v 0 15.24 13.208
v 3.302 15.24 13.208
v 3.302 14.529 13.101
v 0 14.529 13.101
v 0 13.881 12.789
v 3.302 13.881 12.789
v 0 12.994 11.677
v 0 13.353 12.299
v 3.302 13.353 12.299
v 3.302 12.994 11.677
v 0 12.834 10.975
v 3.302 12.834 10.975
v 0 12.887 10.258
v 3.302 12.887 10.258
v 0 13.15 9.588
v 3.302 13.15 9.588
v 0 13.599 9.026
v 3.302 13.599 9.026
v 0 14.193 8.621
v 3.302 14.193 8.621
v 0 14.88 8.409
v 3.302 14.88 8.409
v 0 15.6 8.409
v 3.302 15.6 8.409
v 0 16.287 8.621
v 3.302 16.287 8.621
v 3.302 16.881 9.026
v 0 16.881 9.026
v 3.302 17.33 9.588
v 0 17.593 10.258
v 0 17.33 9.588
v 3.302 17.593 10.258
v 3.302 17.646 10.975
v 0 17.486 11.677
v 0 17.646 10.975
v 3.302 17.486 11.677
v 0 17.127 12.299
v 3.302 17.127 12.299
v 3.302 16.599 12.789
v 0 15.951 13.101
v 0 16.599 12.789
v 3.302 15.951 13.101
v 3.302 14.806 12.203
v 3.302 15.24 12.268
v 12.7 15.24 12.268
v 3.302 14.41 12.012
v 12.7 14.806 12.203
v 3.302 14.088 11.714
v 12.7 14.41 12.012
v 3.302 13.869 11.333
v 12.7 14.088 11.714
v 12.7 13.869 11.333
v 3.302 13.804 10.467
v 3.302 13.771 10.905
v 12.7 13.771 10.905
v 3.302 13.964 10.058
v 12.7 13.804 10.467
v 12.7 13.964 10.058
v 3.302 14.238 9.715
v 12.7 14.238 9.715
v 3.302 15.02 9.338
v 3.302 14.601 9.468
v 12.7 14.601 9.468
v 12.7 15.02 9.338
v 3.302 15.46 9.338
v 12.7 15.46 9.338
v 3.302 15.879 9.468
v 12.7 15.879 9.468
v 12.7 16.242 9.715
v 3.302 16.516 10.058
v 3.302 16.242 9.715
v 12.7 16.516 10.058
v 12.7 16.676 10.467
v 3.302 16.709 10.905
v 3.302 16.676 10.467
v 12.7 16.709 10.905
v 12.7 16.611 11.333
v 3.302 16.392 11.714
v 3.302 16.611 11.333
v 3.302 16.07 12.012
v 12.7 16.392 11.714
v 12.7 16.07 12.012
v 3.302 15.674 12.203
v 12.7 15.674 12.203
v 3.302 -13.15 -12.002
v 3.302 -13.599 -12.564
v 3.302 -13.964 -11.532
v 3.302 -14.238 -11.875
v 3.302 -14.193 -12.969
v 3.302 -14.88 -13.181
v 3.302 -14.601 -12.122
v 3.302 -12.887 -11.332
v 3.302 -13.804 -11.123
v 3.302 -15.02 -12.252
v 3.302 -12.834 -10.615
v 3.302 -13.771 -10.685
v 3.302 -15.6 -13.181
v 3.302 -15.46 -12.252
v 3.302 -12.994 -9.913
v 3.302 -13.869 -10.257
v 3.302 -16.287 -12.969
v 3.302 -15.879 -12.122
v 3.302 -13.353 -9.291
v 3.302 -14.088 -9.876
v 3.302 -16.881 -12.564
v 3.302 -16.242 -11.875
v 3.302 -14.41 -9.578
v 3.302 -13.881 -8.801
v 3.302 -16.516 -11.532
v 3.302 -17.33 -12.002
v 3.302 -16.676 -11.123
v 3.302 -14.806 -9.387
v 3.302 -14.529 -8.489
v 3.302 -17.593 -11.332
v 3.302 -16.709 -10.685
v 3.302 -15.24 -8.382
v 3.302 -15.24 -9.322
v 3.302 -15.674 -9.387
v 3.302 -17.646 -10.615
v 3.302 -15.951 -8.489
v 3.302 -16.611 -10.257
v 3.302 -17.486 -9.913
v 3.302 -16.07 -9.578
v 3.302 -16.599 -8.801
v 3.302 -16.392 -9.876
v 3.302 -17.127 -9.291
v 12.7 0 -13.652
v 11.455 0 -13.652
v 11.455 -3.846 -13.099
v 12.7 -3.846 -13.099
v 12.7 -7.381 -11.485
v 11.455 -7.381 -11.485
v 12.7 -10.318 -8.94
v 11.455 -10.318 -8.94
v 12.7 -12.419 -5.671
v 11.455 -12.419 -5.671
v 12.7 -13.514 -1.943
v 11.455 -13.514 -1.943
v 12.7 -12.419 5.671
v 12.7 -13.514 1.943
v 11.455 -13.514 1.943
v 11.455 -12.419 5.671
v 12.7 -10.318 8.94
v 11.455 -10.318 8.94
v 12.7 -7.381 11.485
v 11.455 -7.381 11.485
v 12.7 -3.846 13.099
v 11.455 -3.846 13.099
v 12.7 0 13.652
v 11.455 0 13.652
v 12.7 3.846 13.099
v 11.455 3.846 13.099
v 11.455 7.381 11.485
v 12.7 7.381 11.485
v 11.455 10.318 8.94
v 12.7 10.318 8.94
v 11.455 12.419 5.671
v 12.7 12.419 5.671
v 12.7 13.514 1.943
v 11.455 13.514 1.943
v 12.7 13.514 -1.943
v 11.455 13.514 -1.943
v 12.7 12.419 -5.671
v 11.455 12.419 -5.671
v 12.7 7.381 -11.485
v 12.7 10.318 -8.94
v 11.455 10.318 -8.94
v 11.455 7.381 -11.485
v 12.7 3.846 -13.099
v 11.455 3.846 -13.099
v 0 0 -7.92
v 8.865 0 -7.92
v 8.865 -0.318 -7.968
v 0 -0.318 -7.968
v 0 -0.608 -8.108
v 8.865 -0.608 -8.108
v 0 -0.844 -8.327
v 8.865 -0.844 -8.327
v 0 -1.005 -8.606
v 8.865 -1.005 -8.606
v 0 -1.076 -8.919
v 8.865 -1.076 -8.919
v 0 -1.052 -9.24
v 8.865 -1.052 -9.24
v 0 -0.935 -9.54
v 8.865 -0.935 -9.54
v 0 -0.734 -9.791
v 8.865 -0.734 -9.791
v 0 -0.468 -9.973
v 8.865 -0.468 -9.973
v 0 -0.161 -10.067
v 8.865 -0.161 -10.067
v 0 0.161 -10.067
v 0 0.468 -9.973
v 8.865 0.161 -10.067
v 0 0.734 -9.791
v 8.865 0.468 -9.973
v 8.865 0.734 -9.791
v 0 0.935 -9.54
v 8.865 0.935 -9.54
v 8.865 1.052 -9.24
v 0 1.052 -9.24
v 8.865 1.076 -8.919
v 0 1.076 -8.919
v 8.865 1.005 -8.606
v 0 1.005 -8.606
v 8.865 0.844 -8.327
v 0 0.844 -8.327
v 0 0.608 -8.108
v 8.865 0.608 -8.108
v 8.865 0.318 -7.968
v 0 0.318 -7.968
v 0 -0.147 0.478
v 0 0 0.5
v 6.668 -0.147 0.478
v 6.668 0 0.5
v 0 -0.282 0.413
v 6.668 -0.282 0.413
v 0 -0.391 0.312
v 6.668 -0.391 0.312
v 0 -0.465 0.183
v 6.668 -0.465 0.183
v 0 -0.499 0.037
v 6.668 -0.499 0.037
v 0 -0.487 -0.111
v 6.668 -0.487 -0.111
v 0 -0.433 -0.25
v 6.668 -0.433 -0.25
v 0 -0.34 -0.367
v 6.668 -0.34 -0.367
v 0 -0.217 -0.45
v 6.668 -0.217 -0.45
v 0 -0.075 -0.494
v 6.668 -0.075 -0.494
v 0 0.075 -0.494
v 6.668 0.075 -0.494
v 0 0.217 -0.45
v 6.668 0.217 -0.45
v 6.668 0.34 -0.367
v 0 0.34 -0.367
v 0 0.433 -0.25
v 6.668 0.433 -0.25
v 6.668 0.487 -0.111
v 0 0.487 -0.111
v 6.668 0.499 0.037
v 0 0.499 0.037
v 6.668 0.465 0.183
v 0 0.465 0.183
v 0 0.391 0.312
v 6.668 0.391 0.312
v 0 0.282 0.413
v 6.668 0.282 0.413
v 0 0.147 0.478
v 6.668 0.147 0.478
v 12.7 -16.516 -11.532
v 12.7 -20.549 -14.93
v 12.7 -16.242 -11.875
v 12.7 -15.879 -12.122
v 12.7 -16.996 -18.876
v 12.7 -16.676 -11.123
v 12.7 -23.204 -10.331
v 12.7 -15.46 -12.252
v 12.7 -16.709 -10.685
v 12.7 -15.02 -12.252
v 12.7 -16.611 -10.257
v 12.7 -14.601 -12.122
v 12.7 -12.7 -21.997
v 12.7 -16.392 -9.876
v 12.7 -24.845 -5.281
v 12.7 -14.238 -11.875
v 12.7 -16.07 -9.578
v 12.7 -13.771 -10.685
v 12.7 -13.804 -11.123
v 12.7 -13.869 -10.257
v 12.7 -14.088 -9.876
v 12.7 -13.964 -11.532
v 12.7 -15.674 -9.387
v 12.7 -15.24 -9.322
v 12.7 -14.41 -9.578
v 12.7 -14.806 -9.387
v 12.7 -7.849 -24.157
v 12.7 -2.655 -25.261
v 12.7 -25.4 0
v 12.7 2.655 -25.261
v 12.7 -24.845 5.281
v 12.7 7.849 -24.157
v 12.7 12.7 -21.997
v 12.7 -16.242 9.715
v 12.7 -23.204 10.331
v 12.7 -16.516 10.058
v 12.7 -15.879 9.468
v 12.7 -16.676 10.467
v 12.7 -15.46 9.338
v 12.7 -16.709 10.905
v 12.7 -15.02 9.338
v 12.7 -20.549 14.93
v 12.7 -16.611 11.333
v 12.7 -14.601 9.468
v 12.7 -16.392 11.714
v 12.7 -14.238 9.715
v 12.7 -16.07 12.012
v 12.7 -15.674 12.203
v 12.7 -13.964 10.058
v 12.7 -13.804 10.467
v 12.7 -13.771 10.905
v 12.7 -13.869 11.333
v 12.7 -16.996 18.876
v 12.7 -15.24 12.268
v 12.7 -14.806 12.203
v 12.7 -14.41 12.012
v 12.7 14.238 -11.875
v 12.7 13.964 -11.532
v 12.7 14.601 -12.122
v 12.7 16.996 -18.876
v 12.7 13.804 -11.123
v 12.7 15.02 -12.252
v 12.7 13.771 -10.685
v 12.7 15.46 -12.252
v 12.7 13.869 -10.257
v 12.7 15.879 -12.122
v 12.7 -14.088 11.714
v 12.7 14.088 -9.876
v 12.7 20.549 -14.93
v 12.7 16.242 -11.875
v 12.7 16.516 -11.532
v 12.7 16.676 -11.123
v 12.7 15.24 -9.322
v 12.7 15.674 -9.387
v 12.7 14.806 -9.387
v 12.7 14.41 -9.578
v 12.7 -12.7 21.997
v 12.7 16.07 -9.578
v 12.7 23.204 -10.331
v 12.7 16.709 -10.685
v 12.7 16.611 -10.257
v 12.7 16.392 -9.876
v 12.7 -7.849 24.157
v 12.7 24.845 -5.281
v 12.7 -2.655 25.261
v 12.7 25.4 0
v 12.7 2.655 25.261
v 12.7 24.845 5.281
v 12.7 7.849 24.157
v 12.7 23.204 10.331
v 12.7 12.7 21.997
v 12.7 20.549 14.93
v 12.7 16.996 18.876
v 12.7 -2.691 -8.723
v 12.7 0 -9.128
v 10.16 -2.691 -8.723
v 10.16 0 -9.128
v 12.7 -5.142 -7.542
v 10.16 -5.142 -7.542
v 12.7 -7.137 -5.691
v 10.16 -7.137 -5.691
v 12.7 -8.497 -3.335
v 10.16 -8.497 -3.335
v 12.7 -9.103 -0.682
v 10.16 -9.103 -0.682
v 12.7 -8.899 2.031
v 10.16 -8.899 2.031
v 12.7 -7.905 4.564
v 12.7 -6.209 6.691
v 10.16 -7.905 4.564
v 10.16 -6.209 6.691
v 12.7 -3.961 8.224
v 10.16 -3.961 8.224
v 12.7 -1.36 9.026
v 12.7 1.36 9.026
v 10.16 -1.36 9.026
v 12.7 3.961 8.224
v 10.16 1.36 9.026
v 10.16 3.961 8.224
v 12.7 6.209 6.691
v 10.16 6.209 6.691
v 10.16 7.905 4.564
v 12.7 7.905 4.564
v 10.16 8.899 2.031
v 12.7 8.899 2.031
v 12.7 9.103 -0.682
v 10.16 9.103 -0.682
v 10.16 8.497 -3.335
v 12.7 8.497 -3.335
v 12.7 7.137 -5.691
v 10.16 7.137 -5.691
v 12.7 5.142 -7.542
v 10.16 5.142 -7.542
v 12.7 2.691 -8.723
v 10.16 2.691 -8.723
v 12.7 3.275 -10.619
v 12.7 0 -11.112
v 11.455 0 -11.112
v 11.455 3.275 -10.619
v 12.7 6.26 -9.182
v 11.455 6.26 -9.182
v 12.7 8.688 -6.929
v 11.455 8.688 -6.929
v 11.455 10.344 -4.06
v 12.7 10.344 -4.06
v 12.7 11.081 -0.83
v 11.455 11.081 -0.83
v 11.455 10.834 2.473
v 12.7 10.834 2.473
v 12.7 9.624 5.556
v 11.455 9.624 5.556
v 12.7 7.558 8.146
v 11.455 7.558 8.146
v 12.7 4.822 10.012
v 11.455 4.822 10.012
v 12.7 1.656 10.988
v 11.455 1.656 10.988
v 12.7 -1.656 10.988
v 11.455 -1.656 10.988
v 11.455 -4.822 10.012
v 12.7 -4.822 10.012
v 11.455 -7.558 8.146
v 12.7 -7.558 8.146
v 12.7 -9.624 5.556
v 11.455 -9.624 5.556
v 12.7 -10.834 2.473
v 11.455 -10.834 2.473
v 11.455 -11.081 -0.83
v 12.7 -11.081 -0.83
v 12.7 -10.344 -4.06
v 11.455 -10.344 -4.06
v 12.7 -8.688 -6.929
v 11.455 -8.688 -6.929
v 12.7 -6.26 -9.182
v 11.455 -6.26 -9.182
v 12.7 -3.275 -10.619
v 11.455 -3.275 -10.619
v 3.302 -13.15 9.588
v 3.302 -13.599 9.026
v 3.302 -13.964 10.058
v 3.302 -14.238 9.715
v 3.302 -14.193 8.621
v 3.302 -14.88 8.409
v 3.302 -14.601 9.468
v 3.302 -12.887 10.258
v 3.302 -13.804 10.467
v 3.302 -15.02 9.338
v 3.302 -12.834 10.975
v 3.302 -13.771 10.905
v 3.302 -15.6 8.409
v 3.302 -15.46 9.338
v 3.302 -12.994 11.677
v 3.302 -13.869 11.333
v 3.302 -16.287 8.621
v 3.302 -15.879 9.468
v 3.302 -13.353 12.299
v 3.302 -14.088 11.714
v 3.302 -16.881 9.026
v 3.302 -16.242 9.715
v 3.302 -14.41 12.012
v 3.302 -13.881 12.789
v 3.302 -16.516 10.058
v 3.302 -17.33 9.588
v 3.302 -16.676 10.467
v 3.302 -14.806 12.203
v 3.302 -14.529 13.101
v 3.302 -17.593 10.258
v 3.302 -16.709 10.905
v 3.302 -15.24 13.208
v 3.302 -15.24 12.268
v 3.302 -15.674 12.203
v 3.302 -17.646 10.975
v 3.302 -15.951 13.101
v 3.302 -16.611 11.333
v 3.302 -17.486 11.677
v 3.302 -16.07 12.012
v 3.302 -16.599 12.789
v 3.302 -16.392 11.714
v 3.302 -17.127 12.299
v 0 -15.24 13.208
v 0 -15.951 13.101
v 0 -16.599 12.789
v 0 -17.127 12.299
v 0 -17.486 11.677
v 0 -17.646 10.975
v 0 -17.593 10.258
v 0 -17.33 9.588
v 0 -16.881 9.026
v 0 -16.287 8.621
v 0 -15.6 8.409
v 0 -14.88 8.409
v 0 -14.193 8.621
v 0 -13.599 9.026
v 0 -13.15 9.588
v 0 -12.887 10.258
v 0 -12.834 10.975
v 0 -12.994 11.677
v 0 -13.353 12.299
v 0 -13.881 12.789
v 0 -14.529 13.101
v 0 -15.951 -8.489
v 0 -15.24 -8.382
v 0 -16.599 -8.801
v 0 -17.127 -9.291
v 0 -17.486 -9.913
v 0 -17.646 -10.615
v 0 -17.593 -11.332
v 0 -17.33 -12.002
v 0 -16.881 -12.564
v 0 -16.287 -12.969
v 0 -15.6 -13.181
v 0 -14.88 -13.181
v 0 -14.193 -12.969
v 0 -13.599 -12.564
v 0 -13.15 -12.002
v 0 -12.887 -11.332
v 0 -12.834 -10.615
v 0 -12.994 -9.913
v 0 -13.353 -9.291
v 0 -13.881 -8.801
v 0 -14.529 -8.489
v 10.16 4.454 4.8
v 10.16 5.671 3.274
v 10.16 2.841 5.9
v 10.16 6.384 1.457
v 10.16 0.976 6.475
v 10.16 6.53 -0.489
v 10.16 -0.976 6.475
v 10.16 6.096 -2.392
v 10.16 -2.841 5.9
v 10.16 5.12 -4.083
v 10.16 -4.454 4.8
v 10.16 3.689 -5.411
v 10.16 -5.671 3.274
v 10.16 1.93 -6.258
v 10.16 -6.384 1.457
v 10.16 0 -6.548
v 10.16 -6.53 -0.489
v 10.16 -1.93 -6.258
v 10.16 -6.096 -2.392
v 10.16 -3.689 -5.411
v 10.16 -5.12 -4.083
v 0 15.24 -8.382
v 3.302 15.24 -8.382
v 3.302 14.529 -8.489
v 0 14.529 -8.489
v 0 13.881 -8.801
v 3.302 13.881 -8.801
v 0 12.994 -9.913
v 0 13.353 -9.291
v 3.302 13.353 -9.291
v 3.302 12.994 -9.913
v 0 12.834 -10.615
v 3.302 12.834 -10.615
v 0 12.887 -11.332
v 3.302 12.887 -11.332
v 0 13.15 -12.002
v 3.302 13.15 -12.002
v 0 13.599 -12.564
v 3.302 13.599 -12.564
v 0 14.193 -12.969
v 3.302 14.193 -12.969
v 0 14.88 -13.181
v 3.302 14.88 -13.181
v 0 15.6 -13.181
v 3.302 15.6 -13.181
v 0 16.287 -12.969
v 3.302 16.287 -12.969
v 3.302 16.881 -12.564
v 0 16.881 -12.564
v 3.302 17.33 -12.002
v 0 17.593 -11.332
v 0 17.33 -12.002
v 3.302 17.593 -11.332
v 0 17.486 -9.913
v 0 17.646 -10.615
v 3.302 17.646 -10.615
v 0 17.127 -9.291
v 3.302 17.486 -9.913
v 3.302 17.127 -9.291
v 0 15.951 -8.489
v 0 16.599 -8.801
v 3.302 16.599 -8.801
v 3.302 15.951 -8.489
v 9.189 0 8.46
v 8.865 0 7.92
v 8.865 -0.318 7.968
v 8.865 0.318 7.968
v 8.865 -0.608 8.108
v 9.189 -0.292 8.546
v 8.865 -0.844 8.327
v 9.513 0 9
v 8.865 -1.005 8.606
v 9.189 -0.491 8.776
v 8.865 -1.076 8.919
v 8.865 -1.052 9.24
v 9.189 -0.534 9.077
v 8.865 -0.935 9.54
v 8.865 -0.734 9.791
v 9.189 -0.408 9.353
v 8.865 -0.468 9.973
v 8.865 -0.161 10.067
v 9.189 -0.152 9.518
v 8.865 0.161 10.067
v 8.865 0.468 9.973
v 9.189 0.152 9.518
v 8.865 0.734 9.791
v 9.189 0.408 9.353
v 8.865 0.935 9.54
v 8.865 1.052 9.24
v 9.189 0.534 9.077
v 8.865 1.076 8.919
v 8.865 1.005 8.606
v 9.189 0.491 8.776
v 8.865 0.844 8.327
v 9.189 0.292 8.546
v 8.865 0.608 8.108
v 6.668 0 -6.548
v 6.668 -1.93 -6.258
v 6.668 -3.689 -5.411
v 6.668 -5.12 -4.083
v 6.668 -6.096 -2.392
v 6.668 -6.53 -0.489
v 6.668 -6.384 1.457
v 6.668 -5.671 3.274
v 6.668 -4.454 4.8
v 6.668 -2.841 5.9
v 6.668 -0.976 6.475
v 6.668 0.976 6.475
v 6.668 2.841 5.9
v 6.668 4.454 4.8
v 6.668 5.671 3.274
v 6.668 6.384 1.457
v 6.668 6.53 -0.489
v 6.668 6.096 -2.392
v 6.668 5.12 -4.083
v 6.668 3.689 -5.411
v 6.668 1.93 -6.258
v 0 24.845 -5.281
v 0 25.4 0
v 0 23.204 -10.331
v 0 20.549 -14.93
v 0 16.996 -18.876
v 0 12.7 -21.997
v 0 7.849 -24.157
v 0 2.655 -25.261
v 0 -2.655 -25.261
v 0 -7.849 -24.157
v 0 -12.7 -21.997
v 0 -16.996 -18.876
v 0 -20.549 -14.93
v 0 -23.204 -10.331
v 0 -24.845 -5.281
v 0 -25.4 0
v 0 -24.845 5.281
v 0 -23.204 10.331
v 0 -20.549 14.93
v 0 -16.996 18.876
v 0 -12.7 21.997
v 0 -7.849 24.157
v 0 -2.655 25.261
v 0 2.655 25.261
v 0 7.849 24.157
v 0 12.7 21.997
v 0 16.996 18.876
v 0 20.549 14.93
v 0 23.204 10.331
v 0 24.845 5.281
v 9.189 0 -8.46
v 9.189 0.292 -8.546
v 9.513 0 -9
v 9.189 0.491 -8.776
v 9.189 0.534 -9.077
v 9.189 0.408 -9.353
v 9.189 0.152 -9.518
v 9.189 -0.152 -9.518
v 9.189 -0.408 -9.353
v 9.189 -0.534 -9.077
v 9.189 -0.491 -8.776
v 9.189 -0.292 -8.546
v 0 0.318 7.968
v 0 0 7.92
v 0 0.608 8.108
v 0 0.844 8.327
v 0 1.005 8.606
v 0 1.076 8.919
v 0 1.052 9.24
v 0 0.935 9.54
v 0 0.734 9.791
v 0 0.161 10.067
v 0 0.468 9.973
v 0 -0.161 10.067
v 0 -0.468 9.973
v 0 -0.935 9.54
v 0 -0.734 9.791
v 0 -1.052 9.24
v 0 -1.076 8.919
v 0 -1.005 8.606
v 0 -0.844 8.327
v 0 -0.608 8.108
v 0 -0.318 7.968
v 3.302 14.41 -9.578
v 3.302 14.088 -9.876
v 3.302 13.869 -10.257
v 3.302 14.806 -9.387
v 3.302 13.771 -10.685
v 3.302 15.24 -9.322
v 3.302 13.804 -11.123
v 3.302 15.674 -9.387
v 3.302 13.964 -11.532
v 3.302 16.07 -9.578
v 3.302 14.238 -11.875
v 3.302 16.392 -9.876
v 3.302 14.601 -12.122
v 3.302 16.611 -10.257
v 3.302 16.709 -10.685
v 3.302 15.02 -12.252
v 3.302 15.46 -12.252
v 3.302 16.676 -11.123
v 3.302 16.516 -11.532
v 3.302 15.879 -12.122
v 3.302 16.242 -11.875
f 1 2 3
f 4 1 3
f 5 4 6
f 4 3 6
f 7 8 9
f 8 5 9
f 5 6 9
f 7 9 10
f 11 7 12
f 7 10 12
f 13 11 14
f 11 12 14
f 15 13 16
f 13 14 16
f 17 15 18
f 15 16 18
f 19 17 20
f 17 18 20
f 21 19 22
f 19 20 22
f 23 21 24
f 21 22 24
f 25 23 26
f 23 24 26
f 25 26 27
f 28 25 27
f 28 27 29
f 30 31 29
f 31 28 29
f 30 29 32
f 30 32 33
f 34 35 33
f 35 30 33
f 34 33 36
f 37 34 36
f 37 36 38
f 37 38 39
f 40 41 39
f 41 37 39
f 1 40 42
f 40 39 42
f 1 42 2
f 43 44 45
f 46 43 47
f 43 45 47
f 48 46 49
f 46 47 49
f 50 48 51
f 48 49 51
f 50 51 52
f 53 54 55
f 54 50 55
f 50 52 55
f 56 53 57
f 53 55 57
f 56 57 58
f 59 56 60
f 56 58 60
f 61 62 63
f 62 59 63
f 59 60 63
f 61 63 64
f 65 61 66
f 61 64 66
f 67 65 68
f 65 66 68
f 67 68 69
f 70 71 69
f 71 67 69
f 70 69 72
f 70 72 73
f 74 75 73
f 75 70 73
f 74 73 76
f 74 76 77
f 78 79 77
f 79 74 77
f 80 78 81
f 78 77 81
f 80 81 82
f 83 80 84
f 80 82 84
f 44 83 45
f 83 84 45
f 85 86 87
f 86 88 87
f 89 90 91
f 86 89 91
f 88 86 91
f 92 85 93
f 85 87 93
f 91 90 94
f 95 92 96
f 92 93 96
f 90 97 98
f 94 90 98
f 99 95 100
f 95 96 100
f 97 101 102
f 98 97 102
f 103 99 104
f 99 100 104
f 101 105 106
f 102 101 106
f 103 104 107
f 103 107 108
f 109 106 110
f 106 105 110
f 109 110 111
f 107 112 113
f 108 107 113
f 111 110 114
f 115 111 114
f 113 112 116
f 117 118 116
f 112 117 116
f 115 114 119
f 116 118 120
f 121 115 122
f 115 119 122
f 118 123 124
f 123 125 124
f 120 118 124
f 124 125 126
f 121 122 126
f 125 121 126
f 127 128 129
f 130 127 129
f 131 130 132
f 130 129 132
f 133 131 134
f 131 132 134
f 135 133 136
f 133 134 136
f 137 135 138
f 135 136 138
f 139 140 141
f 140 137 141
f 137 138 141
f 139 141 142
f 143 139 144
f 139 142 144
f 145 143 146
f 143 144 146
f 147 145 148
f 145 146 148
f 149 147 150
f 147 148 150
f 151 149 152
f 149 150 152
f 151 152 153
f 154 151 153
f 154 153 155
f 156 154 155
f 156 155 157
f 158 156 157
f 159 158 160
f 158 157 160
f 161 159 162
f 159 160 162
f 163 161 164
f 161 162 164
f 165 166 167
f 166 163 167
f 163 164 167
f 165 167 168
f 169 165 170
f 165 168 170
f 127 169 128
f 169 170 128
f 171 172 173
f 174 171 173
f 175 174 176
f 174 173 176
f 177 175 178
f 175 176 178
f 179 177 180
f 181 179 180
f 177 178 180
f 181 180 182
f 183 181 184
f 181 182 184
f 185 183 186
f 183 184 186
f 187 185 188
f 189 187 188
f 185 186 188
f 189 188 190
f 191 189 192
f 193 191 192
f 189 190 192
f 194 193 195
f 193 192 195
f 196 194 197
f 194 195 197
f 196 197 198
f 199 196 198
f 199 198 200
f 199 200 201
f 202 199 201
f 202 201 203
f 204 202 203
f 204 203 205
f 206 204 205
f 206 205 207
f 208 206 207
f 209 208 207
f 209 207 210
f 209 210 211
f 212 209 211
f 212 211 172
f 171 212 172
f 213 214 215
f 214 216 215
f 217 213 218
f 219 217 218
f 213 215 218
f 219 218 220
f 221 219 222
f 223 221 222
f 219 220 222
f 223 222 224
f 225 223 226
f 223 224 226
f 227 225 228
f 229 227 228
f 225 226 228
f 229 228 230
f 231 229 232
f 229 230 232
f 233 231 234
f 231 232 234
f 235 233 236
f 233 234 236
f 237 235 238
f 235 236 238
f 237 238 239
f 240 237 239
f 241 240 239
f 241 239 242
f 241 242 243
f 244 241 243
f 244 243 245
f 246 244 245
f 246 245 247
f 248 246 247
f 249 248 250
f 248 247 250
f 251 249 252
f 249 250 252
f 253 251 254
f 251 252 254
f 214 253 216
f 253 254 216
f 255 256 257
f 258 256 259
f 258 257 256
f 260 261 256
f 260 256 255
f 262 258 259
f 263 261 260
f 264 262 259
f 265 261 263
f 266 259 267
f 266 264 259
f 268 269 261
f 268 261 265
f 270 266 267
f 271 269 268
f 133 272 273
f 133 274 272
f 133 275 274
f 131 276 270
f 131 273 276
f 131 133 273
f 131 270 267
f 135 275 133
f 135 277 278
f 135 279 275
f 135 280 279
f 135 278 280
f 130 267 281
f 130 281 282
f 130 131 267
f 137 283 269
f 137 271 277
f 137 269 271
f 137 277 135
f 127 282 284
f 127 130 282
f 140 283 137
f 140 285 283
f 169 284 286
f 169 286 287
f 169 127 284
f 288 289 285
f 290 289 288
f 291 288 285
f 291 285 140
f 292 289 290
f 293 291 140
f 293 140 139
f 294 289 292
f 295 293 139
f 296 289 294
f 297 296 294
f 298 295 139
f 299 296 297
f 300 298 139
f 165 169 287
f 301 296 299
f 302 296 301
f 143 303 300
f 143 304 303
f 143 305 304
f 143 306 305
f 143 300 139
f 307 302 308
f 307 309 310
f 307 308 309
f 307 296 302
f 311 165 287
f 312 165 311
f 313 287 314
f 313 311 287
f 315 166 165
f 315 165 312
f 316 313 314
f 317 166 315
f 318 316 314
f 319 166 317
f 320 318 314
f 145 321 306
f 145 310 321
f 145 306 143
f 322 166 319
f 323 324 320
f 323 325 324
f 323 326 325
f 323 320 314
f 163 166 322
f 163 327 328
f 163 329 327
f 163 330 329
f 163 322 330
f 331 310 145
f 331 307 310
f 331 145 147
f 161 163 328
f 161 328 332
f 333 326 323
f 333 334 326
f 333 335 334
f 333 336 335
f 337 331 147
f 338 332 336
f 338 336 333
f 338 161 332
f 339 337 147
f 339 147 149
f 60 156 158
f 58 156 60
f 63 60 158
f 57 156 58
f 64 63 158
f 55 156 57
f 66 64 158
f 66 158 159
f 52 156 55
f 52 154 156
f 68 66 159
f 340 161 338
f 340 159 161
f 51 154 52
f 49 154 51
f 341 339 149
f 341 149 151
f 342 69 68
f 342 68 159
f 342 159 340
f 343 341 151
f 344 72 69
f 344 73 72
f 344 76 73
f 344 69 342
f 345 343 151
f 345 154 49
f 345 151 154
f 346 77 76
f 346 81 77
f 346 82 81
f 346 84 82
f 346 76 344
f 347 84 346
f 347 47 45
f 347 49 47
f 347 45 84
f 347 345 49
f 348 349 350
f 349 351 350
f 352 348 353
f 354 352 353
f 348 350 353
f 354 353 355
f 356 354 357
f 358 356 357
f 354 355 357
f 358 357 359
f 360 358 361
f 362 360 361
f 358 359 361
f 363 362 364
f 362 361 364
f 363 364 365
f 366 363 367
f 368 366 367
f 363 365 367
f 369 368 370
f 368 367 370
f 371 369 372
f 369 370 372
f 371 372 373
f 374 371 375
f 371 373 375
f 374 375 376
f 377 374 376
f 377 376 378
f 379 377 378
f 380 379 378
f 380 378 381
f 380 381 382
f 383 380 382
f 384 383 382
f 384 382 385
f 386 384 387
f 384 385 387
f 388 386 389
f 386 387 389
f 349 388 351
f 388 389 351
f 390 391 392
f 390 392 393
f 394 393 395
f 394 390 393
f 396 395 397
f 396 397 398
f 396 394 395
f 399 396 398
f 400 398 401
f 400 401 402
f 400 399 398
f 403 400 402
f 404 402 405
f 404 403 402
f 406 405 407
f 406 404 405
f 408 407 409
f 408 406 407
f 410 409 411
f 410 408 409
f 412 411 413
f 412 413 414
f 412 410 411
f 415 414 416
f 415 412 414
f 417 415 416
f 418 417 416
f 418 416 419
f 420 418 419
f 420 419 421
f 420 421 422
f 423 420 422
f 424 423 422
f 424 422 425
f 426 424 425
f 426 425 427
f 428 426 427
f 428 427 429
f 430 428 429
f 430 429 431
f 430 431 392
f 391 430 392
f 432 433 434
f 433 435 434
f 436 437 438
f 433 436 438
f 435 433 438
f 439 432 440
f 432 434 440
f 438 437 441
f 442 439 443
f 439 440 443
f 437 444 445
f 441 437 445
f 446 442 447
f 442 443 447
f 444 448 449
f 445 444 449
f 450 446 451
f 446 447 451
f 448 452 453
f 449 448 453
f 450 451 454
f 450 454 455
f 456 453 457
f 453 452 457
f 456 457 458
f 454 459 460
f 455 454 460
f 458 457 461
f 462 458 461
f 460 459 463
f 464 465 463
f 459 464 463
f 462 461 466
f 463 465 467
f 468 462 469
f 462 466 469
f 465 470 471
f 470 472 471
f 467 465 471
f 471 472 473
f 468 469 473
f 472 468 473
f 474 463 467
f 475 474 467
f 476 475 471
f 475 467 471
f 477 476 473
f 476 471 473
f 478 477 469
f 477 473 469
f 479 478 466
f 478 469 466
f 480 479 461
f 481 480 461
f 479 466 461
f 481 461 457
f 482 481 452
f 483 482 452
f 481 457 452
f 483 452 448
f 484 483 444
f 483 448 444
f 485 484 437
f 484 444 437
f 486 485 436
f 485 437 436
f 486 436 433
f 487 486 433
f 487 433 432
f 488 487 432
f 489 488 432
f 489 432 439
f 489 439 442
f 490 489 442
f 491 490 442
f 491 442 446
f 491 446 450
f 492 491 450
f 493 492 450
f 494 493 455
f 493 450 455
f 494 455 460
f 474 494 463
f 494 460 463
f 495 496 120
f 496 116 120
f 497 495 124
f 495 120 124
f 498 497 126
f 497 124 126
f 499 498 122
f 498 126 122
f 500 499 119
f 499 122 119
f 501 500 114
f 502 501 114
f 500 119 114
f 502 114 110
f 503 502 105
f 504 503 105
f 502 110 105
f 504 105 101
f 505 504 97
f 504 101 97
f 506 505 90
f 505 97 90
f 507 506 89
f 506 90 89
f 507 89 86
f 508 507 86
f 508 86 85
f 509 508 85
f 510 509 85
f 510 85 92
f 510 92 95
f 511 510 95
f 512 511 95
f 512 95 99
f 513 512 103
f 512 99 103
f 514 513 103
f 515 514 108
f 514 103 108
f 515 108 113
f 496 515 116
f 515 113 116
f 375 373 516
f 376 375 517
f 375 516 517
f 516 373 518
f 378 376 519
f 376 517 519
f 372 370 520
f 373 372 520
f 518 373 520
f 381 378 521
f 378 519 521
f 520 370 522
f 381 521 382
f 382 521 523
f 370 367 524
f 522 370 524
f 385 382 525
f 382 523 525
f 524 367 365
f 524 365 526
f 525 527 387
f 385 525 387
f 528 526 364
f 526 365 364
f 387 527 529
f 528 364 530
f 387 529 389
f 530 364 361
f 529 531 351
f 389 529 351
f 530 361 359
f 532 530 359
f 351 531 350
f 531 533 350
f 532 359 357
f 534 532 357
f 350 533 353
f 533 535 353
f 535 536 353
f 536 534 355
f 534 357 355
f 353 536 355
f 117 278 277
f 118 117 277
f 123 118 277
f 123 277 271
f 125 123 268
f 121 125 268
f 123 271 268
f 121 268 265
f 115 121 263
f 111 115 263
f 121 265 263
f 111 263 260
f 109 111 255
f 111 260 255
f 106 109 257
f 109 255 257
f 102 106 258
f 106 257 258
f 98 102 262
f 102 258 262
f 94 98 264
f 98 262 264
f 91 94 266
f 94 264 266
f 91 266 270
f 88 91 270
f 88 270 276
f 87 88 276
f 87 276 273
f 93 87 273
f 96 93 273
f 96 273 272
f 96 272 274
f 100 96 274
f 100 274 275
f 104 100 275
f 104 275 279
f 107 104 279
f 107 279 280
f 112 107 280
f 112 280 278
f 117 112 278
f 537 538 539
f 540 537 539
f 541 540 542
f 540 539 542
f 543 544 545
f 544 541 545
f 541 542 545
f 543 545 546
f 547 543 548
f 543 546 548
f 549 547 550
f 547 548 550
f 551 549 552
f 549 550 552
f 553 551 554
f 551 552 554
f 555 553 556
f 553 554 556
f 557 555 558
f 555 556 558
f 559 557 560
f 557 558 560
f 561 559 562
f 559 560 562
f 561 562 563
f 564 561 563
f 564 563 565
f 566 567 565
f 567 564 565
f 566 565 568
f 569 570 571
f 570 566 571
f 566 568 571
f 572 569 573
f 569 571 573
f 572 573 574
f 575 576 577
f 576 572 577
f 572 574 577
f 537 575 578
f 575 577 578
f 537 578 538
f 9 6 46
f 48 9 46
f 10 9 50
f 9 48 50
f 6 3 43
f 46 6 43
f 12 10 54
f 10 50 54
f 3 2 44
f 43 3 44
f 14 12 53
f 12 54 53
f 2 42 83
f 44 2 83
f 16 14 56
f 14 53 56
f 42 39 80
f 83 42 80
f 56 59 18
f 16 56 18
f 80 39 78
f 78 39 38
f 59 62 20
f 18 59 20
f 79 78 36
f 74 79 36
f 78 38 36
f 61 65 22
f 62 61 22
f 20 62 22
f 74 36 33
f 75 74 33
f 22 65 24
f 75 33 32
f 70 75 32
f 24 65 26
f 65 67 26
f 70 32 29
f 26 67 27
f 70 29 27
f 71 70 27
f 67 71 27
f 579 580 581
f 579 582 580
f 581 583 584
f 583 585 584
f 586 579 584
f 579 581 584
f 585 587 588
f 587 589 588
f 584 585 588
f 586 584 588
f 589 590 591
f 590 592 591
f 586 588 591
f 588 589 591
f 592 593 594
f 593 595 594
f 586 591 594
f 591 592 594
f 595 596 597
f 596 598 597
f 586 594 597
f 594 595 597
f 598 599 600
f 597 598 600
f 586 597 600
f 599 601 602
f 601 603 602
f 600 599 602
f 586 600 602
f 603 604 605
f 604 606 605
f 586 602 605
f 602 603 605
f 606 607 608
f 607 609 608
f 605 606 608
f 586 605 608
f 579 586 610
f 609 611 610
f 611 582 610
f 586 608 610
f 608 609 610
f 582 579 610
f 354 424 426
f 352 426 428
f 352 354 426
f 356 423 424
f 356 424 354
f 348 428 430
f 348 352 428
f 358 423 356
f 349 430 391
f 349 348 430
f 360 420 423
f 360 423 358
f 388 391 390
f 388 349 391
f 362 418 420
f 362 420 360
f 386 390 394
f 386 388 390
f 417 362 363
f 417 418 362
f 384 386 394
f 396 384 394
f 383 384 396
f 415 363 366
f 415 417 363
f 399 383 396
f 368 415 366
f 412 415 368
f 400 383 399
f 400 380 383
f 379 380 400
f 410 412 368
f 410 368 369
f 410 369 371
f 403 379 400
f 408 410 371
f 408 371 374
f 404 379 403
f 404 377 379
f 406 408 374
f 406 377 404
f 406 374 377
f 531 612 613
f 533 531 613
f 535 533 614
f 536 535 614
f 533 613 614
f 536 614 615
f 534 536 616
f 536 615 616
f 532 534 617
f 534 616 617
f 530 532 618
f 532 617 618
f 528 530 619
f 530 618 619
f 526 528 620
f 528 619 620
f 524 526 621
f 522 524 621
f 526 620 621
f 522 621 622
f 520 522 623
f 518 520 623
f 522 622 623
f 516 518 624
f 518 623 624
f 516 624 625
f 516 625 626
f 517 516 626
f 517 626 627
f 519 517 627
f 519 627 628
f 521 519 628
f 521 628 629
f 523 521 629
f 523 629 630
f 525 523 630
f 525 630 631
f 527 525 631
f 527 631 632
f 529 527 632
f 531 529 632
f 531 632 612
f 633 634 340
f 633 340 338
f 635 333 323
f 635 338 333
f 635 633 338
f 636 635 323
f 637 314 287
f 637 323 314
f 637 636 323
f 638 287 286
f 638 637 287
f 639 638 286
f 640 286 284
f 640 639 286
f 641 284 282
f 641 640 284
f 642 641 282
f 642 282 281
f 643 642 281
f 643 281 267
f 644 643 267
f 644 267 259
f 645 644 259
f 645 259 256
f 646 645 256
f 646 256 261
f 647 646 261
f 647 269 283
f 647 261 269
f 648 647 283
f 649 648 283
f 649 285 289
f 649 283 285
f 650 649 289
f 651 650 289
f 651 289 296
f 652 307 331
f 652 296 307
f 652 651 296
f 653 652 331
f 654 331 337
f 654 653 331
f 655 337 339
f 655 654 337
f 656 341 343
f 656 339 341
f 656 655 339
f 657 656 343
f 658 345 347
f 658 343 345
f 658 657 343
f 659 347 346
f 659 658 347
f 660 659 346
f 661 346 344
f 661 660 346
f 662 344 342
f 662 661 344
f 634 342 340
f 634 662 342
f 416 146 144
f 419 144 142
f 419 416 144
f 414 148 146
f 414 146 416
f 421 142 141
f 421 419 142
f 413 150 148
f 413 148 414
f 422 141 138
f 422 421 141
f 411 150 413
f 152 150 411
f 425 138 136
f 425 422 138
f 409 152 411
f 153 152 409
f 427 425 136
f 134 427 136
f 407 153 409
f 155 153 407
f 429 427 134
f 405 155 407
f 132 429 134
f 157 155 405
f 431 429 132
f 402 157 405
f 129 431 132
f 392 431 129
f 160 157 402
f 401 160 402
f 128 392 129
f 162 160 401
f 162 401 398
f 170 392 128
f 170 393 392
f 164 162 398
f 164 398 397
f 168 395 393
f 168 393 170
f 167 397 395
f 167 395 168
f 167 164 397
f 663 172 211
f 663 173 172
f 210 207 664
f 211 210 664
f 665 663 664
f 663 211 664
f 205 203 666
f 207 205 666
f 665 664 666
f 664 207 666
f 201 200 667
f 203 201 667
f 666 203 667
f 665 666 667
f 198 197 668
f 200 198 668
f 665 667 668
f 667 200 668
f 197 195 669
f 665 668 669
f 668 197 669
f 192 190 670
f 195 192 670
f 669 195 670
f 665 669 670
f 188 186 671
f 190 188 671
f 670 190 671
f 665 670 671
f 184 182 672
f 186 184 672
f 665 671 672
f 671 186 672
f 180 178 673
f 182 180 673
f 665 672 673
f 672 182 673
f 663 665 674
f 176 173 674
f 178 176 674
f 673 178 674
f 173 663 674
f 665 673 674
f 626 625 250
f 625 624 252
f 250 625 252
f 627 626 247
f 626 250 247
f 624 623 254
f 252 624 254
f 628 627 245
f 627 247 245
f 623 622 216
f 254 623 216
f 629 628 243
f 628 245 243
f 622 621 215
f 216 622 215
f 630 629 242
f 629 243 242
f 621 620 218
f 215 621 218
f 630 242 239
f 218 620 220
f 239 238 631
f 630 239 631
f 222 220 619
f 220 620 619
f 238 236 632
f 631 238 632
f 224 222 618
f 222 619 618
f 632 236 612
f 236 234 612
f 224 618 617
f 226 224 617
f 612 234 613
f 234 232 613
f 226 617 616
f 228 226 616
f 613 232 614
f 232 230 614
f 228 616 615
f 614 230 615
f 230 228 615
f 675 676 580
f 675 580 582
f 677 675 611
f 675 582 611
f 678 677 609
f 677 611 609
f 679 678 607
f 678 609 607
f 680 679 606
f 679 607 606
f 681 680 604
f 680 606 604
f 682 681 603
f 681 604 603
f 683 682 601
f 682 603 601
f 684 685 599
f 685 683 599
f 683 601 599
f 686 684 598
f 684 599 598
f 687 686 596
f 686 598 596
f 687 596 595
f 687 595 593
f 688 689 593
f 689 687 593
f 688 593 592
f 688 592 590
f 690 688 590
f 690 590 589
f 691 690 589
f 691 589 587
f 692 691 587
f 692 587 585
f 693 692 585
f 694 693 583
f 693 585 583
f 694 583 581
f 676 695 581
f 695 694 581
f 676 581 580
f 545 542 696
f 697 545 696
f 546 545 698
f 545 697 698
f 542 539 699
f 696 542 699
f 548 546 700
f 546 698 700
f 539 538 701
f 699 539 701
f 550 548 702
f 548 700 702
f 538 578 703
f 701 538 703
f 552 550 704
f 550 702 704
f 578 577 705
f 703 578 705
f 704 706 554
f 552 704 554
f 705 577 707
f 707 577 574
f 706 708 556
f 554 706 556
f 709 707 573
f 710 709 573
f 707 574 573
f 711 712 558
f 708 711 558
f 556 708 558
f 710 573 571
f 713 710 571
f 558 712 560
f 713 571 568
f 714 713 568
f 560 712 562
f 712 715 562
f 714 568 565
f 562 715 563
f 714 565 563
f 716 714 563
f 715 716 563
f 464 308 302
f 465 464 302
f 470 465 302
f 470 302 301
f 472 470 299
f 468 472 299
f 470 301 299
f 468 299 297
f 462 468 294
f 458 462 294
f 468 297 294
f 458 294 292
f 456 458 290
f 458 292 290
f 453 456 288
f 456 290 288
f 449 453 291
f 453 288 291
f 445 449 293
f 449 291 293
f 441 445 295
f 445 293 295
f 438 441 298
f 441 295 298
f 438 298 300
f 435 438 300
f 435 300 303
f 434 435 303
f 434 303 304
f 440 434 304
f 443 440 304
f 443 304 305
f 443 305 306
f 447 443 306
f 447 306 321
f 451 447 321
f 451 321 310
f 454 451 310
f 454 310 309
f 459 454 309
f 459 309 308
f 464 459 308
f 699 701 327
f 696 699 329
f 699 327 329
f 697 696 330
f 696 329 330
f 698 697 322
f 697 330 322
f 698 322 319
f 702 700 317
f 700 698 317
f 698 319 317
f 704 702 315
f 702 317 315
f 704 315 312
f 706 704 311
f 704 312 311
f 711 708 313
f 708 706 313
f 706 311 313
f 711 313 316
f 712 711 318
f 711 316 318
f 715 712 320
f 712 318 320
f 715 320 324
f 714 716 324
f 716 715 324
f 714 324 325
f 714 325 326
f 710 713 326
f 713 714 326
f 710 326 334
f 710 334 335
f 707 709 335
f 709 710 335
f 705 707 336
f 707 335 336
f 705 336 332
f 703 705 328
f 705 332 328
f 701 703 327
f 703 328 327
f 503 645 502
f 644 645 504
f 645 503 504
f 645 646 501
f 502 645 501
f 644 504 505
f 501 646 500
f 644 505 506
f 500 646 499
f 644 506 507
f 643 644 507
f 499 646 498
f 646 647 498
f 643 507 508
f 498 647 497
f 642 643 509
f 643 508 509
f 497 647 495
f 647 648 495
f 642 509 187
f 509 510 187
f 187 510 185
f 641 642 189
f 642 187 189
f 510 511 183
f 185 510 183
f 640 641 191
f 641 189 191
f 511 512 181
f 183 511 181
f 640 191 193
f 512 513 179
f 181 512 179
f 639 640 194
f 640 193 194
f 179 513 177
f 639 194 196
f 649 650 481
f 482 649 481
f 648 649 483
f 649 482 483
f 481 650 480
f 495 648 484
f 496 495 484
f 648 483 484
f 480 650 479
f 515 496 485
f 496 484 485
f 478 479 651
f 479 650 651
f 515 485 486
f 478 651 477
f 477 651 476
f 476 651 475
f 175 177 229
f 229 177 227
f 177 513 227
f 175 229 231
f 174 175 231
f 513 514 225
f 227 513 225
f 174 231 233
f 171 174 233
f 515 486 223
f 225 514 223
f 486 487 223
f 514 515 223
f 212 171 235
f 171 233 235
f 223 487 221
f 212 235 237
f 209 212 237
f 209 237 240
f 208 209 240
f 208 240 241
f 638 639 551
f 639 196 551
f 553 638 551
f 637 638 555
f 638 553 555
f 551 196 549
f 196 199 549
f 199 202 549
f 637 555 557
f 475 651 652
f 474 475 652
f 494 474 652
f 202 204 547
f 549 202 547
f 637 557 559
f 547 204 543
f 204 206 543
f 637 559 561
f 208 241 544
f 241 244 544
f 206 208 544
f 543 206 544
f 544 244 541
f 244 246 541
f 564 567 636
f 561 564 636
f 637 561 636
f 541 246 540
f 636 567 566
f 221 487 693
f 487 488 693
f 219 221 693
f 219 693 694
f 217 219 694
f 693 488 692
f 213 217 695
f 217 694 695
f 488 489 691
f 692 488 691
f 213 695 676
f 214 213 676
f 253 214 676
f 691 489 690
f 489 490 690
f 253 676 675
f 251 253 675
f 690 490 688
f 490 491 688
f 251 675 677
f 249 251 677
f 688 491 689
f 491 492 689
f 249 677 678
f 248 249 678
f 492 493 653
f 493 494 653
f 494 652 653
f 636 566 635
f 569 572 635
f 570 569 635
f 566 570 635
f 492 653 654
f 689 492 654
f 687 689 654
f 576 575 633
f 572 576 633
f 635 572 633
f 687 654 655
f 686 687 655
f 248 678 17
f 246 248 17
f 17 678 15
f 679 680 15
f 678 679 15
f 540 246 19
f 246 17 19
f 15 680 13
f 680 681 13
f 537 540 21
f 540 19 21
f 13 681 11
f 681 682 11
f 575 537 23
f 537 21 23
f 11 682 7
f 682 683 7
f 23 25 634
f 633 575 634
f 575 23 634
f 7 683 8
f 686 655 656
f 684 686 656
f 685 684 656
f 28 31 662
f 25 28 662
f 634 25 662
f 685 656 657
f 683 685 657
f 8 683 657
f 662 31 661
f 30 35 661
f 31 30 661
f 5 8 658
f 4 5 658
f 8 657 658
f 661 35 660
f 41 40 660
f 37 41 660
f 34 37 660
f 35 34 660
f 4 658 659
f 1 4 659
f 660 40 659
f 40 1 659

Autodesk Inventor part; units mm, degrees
ref_plane "YZ Plane" through (0, 0, 0) normal (1, 0, 0) x (0, 1, 0)
sketch "Sketch1" plane through (0, 0, 0) normal (1, 0, 0) x (0, 1, 0)
  circle A0 centre (0, 0) radius 25.4
  dimension "d0" = 50.8
extrude "Extrusion1" add sketch "Sketch1" along normal blind 12.7
sketch "Sketch10" plane through (12.7, 0, 0) normal (1, 0, 0) x (0, 0, -1)
  point P0 (0, 0)
  point P1 (0, 0)
hole "Hole4" at (12.7, 0, 0) direction (-1, 0, 0) diameter 18.2563 depth 2.54
ref_plane "Work Plane2" through (11.43, 0, 0) normal (1, 0, 0) x (0, 0, -1)
hole "Hole1" at (11.43, 0, 0) direction (-1, 0, 0) diameter 13.0969 depth 4.7625
ref_plane "Work Plane1" through (-12.7, 0, 0) normal (1, 0, 0) x (0, 0, -1)
sketch "Sketch5" plane through (0, 0, 0) normal (1, 0, 0) x (0, 1, 0)
  line L0 (0, 9) -> (0, -9)
  circle A0 centre (0, 0) radius 25.4 projected
  line L1 (-15.24, 0) -> (15.24, 0)
  line L2 (-15.24, 10.795) -> (-15.24, -10.795)
  dimension "d37" = 18
  dimension "d45" = 30.48
  dimension "d46" = 21.59
hole "Hole2" at (0, 0, -9) direction (1, 0, 0) diameter 2.159 depth 8.8646 tip angle 118
sketch "Sketch6" plane through (0, 0, 0) normal (-1, 0, 0) x (0, 0, 1)
  circle A0 centre (0, 0) radius 0.5715
  dimension "d34" = 1.143
hole "Hole5" at (0, 0, 0) direction (1, 0, 0) diameter 1 end through all
mirror "Mirror1" about plane through (0, 0, 0) normal (0, 0, 1) of "Hole2"
hole "Hole3" at (0, -15.24, 10.795) at (0, -15.24, -10.795) direction (1, 0, 0) diameter 2.9464 end through all counterbore diameter 4.826 counterbore depth 3.302 clearance for "Socket Head Cap Screw" size "#4" standard "Ansi Unified Screw Threads"
mirror "Mirror2" about plane through (0, 0, 0) normal (0, 1, 0) of "Hole3"
sketch "Sketch9" plane through (0, 0, 0) normal (0, 1, 0) x (-1, 0, 0)
  line L0 (-11.4554, -11.1125) -> (-12.7, -11.1125)
  line L1 (-12.7, -11.1125) -> (-12.7, -13.6525)
  line L2 (-12.7, -13.6525) -> (-11.4554, -13.6525)
  line L3 (-11.4554, -13.6525) -> (-11.4554, -11.1125)
  line L4 (2.54, 0) -> (-15.24, 0) projected
  line L5 (-12.7, 25.4) -> (-12.7, -25.4) projected
  point P0 (0, 0)
  dimension "d55" = 2.54
  dimension "d56" = 1.2446
  dimension "d59" = 11.1125
revolve "Revolution1" cut sketch "Sketch9" angle 360 about axis through (-10, 0, 0) along (1, 0, 0)
properties part number ".5 in hole" material "Aluminum 6061"
